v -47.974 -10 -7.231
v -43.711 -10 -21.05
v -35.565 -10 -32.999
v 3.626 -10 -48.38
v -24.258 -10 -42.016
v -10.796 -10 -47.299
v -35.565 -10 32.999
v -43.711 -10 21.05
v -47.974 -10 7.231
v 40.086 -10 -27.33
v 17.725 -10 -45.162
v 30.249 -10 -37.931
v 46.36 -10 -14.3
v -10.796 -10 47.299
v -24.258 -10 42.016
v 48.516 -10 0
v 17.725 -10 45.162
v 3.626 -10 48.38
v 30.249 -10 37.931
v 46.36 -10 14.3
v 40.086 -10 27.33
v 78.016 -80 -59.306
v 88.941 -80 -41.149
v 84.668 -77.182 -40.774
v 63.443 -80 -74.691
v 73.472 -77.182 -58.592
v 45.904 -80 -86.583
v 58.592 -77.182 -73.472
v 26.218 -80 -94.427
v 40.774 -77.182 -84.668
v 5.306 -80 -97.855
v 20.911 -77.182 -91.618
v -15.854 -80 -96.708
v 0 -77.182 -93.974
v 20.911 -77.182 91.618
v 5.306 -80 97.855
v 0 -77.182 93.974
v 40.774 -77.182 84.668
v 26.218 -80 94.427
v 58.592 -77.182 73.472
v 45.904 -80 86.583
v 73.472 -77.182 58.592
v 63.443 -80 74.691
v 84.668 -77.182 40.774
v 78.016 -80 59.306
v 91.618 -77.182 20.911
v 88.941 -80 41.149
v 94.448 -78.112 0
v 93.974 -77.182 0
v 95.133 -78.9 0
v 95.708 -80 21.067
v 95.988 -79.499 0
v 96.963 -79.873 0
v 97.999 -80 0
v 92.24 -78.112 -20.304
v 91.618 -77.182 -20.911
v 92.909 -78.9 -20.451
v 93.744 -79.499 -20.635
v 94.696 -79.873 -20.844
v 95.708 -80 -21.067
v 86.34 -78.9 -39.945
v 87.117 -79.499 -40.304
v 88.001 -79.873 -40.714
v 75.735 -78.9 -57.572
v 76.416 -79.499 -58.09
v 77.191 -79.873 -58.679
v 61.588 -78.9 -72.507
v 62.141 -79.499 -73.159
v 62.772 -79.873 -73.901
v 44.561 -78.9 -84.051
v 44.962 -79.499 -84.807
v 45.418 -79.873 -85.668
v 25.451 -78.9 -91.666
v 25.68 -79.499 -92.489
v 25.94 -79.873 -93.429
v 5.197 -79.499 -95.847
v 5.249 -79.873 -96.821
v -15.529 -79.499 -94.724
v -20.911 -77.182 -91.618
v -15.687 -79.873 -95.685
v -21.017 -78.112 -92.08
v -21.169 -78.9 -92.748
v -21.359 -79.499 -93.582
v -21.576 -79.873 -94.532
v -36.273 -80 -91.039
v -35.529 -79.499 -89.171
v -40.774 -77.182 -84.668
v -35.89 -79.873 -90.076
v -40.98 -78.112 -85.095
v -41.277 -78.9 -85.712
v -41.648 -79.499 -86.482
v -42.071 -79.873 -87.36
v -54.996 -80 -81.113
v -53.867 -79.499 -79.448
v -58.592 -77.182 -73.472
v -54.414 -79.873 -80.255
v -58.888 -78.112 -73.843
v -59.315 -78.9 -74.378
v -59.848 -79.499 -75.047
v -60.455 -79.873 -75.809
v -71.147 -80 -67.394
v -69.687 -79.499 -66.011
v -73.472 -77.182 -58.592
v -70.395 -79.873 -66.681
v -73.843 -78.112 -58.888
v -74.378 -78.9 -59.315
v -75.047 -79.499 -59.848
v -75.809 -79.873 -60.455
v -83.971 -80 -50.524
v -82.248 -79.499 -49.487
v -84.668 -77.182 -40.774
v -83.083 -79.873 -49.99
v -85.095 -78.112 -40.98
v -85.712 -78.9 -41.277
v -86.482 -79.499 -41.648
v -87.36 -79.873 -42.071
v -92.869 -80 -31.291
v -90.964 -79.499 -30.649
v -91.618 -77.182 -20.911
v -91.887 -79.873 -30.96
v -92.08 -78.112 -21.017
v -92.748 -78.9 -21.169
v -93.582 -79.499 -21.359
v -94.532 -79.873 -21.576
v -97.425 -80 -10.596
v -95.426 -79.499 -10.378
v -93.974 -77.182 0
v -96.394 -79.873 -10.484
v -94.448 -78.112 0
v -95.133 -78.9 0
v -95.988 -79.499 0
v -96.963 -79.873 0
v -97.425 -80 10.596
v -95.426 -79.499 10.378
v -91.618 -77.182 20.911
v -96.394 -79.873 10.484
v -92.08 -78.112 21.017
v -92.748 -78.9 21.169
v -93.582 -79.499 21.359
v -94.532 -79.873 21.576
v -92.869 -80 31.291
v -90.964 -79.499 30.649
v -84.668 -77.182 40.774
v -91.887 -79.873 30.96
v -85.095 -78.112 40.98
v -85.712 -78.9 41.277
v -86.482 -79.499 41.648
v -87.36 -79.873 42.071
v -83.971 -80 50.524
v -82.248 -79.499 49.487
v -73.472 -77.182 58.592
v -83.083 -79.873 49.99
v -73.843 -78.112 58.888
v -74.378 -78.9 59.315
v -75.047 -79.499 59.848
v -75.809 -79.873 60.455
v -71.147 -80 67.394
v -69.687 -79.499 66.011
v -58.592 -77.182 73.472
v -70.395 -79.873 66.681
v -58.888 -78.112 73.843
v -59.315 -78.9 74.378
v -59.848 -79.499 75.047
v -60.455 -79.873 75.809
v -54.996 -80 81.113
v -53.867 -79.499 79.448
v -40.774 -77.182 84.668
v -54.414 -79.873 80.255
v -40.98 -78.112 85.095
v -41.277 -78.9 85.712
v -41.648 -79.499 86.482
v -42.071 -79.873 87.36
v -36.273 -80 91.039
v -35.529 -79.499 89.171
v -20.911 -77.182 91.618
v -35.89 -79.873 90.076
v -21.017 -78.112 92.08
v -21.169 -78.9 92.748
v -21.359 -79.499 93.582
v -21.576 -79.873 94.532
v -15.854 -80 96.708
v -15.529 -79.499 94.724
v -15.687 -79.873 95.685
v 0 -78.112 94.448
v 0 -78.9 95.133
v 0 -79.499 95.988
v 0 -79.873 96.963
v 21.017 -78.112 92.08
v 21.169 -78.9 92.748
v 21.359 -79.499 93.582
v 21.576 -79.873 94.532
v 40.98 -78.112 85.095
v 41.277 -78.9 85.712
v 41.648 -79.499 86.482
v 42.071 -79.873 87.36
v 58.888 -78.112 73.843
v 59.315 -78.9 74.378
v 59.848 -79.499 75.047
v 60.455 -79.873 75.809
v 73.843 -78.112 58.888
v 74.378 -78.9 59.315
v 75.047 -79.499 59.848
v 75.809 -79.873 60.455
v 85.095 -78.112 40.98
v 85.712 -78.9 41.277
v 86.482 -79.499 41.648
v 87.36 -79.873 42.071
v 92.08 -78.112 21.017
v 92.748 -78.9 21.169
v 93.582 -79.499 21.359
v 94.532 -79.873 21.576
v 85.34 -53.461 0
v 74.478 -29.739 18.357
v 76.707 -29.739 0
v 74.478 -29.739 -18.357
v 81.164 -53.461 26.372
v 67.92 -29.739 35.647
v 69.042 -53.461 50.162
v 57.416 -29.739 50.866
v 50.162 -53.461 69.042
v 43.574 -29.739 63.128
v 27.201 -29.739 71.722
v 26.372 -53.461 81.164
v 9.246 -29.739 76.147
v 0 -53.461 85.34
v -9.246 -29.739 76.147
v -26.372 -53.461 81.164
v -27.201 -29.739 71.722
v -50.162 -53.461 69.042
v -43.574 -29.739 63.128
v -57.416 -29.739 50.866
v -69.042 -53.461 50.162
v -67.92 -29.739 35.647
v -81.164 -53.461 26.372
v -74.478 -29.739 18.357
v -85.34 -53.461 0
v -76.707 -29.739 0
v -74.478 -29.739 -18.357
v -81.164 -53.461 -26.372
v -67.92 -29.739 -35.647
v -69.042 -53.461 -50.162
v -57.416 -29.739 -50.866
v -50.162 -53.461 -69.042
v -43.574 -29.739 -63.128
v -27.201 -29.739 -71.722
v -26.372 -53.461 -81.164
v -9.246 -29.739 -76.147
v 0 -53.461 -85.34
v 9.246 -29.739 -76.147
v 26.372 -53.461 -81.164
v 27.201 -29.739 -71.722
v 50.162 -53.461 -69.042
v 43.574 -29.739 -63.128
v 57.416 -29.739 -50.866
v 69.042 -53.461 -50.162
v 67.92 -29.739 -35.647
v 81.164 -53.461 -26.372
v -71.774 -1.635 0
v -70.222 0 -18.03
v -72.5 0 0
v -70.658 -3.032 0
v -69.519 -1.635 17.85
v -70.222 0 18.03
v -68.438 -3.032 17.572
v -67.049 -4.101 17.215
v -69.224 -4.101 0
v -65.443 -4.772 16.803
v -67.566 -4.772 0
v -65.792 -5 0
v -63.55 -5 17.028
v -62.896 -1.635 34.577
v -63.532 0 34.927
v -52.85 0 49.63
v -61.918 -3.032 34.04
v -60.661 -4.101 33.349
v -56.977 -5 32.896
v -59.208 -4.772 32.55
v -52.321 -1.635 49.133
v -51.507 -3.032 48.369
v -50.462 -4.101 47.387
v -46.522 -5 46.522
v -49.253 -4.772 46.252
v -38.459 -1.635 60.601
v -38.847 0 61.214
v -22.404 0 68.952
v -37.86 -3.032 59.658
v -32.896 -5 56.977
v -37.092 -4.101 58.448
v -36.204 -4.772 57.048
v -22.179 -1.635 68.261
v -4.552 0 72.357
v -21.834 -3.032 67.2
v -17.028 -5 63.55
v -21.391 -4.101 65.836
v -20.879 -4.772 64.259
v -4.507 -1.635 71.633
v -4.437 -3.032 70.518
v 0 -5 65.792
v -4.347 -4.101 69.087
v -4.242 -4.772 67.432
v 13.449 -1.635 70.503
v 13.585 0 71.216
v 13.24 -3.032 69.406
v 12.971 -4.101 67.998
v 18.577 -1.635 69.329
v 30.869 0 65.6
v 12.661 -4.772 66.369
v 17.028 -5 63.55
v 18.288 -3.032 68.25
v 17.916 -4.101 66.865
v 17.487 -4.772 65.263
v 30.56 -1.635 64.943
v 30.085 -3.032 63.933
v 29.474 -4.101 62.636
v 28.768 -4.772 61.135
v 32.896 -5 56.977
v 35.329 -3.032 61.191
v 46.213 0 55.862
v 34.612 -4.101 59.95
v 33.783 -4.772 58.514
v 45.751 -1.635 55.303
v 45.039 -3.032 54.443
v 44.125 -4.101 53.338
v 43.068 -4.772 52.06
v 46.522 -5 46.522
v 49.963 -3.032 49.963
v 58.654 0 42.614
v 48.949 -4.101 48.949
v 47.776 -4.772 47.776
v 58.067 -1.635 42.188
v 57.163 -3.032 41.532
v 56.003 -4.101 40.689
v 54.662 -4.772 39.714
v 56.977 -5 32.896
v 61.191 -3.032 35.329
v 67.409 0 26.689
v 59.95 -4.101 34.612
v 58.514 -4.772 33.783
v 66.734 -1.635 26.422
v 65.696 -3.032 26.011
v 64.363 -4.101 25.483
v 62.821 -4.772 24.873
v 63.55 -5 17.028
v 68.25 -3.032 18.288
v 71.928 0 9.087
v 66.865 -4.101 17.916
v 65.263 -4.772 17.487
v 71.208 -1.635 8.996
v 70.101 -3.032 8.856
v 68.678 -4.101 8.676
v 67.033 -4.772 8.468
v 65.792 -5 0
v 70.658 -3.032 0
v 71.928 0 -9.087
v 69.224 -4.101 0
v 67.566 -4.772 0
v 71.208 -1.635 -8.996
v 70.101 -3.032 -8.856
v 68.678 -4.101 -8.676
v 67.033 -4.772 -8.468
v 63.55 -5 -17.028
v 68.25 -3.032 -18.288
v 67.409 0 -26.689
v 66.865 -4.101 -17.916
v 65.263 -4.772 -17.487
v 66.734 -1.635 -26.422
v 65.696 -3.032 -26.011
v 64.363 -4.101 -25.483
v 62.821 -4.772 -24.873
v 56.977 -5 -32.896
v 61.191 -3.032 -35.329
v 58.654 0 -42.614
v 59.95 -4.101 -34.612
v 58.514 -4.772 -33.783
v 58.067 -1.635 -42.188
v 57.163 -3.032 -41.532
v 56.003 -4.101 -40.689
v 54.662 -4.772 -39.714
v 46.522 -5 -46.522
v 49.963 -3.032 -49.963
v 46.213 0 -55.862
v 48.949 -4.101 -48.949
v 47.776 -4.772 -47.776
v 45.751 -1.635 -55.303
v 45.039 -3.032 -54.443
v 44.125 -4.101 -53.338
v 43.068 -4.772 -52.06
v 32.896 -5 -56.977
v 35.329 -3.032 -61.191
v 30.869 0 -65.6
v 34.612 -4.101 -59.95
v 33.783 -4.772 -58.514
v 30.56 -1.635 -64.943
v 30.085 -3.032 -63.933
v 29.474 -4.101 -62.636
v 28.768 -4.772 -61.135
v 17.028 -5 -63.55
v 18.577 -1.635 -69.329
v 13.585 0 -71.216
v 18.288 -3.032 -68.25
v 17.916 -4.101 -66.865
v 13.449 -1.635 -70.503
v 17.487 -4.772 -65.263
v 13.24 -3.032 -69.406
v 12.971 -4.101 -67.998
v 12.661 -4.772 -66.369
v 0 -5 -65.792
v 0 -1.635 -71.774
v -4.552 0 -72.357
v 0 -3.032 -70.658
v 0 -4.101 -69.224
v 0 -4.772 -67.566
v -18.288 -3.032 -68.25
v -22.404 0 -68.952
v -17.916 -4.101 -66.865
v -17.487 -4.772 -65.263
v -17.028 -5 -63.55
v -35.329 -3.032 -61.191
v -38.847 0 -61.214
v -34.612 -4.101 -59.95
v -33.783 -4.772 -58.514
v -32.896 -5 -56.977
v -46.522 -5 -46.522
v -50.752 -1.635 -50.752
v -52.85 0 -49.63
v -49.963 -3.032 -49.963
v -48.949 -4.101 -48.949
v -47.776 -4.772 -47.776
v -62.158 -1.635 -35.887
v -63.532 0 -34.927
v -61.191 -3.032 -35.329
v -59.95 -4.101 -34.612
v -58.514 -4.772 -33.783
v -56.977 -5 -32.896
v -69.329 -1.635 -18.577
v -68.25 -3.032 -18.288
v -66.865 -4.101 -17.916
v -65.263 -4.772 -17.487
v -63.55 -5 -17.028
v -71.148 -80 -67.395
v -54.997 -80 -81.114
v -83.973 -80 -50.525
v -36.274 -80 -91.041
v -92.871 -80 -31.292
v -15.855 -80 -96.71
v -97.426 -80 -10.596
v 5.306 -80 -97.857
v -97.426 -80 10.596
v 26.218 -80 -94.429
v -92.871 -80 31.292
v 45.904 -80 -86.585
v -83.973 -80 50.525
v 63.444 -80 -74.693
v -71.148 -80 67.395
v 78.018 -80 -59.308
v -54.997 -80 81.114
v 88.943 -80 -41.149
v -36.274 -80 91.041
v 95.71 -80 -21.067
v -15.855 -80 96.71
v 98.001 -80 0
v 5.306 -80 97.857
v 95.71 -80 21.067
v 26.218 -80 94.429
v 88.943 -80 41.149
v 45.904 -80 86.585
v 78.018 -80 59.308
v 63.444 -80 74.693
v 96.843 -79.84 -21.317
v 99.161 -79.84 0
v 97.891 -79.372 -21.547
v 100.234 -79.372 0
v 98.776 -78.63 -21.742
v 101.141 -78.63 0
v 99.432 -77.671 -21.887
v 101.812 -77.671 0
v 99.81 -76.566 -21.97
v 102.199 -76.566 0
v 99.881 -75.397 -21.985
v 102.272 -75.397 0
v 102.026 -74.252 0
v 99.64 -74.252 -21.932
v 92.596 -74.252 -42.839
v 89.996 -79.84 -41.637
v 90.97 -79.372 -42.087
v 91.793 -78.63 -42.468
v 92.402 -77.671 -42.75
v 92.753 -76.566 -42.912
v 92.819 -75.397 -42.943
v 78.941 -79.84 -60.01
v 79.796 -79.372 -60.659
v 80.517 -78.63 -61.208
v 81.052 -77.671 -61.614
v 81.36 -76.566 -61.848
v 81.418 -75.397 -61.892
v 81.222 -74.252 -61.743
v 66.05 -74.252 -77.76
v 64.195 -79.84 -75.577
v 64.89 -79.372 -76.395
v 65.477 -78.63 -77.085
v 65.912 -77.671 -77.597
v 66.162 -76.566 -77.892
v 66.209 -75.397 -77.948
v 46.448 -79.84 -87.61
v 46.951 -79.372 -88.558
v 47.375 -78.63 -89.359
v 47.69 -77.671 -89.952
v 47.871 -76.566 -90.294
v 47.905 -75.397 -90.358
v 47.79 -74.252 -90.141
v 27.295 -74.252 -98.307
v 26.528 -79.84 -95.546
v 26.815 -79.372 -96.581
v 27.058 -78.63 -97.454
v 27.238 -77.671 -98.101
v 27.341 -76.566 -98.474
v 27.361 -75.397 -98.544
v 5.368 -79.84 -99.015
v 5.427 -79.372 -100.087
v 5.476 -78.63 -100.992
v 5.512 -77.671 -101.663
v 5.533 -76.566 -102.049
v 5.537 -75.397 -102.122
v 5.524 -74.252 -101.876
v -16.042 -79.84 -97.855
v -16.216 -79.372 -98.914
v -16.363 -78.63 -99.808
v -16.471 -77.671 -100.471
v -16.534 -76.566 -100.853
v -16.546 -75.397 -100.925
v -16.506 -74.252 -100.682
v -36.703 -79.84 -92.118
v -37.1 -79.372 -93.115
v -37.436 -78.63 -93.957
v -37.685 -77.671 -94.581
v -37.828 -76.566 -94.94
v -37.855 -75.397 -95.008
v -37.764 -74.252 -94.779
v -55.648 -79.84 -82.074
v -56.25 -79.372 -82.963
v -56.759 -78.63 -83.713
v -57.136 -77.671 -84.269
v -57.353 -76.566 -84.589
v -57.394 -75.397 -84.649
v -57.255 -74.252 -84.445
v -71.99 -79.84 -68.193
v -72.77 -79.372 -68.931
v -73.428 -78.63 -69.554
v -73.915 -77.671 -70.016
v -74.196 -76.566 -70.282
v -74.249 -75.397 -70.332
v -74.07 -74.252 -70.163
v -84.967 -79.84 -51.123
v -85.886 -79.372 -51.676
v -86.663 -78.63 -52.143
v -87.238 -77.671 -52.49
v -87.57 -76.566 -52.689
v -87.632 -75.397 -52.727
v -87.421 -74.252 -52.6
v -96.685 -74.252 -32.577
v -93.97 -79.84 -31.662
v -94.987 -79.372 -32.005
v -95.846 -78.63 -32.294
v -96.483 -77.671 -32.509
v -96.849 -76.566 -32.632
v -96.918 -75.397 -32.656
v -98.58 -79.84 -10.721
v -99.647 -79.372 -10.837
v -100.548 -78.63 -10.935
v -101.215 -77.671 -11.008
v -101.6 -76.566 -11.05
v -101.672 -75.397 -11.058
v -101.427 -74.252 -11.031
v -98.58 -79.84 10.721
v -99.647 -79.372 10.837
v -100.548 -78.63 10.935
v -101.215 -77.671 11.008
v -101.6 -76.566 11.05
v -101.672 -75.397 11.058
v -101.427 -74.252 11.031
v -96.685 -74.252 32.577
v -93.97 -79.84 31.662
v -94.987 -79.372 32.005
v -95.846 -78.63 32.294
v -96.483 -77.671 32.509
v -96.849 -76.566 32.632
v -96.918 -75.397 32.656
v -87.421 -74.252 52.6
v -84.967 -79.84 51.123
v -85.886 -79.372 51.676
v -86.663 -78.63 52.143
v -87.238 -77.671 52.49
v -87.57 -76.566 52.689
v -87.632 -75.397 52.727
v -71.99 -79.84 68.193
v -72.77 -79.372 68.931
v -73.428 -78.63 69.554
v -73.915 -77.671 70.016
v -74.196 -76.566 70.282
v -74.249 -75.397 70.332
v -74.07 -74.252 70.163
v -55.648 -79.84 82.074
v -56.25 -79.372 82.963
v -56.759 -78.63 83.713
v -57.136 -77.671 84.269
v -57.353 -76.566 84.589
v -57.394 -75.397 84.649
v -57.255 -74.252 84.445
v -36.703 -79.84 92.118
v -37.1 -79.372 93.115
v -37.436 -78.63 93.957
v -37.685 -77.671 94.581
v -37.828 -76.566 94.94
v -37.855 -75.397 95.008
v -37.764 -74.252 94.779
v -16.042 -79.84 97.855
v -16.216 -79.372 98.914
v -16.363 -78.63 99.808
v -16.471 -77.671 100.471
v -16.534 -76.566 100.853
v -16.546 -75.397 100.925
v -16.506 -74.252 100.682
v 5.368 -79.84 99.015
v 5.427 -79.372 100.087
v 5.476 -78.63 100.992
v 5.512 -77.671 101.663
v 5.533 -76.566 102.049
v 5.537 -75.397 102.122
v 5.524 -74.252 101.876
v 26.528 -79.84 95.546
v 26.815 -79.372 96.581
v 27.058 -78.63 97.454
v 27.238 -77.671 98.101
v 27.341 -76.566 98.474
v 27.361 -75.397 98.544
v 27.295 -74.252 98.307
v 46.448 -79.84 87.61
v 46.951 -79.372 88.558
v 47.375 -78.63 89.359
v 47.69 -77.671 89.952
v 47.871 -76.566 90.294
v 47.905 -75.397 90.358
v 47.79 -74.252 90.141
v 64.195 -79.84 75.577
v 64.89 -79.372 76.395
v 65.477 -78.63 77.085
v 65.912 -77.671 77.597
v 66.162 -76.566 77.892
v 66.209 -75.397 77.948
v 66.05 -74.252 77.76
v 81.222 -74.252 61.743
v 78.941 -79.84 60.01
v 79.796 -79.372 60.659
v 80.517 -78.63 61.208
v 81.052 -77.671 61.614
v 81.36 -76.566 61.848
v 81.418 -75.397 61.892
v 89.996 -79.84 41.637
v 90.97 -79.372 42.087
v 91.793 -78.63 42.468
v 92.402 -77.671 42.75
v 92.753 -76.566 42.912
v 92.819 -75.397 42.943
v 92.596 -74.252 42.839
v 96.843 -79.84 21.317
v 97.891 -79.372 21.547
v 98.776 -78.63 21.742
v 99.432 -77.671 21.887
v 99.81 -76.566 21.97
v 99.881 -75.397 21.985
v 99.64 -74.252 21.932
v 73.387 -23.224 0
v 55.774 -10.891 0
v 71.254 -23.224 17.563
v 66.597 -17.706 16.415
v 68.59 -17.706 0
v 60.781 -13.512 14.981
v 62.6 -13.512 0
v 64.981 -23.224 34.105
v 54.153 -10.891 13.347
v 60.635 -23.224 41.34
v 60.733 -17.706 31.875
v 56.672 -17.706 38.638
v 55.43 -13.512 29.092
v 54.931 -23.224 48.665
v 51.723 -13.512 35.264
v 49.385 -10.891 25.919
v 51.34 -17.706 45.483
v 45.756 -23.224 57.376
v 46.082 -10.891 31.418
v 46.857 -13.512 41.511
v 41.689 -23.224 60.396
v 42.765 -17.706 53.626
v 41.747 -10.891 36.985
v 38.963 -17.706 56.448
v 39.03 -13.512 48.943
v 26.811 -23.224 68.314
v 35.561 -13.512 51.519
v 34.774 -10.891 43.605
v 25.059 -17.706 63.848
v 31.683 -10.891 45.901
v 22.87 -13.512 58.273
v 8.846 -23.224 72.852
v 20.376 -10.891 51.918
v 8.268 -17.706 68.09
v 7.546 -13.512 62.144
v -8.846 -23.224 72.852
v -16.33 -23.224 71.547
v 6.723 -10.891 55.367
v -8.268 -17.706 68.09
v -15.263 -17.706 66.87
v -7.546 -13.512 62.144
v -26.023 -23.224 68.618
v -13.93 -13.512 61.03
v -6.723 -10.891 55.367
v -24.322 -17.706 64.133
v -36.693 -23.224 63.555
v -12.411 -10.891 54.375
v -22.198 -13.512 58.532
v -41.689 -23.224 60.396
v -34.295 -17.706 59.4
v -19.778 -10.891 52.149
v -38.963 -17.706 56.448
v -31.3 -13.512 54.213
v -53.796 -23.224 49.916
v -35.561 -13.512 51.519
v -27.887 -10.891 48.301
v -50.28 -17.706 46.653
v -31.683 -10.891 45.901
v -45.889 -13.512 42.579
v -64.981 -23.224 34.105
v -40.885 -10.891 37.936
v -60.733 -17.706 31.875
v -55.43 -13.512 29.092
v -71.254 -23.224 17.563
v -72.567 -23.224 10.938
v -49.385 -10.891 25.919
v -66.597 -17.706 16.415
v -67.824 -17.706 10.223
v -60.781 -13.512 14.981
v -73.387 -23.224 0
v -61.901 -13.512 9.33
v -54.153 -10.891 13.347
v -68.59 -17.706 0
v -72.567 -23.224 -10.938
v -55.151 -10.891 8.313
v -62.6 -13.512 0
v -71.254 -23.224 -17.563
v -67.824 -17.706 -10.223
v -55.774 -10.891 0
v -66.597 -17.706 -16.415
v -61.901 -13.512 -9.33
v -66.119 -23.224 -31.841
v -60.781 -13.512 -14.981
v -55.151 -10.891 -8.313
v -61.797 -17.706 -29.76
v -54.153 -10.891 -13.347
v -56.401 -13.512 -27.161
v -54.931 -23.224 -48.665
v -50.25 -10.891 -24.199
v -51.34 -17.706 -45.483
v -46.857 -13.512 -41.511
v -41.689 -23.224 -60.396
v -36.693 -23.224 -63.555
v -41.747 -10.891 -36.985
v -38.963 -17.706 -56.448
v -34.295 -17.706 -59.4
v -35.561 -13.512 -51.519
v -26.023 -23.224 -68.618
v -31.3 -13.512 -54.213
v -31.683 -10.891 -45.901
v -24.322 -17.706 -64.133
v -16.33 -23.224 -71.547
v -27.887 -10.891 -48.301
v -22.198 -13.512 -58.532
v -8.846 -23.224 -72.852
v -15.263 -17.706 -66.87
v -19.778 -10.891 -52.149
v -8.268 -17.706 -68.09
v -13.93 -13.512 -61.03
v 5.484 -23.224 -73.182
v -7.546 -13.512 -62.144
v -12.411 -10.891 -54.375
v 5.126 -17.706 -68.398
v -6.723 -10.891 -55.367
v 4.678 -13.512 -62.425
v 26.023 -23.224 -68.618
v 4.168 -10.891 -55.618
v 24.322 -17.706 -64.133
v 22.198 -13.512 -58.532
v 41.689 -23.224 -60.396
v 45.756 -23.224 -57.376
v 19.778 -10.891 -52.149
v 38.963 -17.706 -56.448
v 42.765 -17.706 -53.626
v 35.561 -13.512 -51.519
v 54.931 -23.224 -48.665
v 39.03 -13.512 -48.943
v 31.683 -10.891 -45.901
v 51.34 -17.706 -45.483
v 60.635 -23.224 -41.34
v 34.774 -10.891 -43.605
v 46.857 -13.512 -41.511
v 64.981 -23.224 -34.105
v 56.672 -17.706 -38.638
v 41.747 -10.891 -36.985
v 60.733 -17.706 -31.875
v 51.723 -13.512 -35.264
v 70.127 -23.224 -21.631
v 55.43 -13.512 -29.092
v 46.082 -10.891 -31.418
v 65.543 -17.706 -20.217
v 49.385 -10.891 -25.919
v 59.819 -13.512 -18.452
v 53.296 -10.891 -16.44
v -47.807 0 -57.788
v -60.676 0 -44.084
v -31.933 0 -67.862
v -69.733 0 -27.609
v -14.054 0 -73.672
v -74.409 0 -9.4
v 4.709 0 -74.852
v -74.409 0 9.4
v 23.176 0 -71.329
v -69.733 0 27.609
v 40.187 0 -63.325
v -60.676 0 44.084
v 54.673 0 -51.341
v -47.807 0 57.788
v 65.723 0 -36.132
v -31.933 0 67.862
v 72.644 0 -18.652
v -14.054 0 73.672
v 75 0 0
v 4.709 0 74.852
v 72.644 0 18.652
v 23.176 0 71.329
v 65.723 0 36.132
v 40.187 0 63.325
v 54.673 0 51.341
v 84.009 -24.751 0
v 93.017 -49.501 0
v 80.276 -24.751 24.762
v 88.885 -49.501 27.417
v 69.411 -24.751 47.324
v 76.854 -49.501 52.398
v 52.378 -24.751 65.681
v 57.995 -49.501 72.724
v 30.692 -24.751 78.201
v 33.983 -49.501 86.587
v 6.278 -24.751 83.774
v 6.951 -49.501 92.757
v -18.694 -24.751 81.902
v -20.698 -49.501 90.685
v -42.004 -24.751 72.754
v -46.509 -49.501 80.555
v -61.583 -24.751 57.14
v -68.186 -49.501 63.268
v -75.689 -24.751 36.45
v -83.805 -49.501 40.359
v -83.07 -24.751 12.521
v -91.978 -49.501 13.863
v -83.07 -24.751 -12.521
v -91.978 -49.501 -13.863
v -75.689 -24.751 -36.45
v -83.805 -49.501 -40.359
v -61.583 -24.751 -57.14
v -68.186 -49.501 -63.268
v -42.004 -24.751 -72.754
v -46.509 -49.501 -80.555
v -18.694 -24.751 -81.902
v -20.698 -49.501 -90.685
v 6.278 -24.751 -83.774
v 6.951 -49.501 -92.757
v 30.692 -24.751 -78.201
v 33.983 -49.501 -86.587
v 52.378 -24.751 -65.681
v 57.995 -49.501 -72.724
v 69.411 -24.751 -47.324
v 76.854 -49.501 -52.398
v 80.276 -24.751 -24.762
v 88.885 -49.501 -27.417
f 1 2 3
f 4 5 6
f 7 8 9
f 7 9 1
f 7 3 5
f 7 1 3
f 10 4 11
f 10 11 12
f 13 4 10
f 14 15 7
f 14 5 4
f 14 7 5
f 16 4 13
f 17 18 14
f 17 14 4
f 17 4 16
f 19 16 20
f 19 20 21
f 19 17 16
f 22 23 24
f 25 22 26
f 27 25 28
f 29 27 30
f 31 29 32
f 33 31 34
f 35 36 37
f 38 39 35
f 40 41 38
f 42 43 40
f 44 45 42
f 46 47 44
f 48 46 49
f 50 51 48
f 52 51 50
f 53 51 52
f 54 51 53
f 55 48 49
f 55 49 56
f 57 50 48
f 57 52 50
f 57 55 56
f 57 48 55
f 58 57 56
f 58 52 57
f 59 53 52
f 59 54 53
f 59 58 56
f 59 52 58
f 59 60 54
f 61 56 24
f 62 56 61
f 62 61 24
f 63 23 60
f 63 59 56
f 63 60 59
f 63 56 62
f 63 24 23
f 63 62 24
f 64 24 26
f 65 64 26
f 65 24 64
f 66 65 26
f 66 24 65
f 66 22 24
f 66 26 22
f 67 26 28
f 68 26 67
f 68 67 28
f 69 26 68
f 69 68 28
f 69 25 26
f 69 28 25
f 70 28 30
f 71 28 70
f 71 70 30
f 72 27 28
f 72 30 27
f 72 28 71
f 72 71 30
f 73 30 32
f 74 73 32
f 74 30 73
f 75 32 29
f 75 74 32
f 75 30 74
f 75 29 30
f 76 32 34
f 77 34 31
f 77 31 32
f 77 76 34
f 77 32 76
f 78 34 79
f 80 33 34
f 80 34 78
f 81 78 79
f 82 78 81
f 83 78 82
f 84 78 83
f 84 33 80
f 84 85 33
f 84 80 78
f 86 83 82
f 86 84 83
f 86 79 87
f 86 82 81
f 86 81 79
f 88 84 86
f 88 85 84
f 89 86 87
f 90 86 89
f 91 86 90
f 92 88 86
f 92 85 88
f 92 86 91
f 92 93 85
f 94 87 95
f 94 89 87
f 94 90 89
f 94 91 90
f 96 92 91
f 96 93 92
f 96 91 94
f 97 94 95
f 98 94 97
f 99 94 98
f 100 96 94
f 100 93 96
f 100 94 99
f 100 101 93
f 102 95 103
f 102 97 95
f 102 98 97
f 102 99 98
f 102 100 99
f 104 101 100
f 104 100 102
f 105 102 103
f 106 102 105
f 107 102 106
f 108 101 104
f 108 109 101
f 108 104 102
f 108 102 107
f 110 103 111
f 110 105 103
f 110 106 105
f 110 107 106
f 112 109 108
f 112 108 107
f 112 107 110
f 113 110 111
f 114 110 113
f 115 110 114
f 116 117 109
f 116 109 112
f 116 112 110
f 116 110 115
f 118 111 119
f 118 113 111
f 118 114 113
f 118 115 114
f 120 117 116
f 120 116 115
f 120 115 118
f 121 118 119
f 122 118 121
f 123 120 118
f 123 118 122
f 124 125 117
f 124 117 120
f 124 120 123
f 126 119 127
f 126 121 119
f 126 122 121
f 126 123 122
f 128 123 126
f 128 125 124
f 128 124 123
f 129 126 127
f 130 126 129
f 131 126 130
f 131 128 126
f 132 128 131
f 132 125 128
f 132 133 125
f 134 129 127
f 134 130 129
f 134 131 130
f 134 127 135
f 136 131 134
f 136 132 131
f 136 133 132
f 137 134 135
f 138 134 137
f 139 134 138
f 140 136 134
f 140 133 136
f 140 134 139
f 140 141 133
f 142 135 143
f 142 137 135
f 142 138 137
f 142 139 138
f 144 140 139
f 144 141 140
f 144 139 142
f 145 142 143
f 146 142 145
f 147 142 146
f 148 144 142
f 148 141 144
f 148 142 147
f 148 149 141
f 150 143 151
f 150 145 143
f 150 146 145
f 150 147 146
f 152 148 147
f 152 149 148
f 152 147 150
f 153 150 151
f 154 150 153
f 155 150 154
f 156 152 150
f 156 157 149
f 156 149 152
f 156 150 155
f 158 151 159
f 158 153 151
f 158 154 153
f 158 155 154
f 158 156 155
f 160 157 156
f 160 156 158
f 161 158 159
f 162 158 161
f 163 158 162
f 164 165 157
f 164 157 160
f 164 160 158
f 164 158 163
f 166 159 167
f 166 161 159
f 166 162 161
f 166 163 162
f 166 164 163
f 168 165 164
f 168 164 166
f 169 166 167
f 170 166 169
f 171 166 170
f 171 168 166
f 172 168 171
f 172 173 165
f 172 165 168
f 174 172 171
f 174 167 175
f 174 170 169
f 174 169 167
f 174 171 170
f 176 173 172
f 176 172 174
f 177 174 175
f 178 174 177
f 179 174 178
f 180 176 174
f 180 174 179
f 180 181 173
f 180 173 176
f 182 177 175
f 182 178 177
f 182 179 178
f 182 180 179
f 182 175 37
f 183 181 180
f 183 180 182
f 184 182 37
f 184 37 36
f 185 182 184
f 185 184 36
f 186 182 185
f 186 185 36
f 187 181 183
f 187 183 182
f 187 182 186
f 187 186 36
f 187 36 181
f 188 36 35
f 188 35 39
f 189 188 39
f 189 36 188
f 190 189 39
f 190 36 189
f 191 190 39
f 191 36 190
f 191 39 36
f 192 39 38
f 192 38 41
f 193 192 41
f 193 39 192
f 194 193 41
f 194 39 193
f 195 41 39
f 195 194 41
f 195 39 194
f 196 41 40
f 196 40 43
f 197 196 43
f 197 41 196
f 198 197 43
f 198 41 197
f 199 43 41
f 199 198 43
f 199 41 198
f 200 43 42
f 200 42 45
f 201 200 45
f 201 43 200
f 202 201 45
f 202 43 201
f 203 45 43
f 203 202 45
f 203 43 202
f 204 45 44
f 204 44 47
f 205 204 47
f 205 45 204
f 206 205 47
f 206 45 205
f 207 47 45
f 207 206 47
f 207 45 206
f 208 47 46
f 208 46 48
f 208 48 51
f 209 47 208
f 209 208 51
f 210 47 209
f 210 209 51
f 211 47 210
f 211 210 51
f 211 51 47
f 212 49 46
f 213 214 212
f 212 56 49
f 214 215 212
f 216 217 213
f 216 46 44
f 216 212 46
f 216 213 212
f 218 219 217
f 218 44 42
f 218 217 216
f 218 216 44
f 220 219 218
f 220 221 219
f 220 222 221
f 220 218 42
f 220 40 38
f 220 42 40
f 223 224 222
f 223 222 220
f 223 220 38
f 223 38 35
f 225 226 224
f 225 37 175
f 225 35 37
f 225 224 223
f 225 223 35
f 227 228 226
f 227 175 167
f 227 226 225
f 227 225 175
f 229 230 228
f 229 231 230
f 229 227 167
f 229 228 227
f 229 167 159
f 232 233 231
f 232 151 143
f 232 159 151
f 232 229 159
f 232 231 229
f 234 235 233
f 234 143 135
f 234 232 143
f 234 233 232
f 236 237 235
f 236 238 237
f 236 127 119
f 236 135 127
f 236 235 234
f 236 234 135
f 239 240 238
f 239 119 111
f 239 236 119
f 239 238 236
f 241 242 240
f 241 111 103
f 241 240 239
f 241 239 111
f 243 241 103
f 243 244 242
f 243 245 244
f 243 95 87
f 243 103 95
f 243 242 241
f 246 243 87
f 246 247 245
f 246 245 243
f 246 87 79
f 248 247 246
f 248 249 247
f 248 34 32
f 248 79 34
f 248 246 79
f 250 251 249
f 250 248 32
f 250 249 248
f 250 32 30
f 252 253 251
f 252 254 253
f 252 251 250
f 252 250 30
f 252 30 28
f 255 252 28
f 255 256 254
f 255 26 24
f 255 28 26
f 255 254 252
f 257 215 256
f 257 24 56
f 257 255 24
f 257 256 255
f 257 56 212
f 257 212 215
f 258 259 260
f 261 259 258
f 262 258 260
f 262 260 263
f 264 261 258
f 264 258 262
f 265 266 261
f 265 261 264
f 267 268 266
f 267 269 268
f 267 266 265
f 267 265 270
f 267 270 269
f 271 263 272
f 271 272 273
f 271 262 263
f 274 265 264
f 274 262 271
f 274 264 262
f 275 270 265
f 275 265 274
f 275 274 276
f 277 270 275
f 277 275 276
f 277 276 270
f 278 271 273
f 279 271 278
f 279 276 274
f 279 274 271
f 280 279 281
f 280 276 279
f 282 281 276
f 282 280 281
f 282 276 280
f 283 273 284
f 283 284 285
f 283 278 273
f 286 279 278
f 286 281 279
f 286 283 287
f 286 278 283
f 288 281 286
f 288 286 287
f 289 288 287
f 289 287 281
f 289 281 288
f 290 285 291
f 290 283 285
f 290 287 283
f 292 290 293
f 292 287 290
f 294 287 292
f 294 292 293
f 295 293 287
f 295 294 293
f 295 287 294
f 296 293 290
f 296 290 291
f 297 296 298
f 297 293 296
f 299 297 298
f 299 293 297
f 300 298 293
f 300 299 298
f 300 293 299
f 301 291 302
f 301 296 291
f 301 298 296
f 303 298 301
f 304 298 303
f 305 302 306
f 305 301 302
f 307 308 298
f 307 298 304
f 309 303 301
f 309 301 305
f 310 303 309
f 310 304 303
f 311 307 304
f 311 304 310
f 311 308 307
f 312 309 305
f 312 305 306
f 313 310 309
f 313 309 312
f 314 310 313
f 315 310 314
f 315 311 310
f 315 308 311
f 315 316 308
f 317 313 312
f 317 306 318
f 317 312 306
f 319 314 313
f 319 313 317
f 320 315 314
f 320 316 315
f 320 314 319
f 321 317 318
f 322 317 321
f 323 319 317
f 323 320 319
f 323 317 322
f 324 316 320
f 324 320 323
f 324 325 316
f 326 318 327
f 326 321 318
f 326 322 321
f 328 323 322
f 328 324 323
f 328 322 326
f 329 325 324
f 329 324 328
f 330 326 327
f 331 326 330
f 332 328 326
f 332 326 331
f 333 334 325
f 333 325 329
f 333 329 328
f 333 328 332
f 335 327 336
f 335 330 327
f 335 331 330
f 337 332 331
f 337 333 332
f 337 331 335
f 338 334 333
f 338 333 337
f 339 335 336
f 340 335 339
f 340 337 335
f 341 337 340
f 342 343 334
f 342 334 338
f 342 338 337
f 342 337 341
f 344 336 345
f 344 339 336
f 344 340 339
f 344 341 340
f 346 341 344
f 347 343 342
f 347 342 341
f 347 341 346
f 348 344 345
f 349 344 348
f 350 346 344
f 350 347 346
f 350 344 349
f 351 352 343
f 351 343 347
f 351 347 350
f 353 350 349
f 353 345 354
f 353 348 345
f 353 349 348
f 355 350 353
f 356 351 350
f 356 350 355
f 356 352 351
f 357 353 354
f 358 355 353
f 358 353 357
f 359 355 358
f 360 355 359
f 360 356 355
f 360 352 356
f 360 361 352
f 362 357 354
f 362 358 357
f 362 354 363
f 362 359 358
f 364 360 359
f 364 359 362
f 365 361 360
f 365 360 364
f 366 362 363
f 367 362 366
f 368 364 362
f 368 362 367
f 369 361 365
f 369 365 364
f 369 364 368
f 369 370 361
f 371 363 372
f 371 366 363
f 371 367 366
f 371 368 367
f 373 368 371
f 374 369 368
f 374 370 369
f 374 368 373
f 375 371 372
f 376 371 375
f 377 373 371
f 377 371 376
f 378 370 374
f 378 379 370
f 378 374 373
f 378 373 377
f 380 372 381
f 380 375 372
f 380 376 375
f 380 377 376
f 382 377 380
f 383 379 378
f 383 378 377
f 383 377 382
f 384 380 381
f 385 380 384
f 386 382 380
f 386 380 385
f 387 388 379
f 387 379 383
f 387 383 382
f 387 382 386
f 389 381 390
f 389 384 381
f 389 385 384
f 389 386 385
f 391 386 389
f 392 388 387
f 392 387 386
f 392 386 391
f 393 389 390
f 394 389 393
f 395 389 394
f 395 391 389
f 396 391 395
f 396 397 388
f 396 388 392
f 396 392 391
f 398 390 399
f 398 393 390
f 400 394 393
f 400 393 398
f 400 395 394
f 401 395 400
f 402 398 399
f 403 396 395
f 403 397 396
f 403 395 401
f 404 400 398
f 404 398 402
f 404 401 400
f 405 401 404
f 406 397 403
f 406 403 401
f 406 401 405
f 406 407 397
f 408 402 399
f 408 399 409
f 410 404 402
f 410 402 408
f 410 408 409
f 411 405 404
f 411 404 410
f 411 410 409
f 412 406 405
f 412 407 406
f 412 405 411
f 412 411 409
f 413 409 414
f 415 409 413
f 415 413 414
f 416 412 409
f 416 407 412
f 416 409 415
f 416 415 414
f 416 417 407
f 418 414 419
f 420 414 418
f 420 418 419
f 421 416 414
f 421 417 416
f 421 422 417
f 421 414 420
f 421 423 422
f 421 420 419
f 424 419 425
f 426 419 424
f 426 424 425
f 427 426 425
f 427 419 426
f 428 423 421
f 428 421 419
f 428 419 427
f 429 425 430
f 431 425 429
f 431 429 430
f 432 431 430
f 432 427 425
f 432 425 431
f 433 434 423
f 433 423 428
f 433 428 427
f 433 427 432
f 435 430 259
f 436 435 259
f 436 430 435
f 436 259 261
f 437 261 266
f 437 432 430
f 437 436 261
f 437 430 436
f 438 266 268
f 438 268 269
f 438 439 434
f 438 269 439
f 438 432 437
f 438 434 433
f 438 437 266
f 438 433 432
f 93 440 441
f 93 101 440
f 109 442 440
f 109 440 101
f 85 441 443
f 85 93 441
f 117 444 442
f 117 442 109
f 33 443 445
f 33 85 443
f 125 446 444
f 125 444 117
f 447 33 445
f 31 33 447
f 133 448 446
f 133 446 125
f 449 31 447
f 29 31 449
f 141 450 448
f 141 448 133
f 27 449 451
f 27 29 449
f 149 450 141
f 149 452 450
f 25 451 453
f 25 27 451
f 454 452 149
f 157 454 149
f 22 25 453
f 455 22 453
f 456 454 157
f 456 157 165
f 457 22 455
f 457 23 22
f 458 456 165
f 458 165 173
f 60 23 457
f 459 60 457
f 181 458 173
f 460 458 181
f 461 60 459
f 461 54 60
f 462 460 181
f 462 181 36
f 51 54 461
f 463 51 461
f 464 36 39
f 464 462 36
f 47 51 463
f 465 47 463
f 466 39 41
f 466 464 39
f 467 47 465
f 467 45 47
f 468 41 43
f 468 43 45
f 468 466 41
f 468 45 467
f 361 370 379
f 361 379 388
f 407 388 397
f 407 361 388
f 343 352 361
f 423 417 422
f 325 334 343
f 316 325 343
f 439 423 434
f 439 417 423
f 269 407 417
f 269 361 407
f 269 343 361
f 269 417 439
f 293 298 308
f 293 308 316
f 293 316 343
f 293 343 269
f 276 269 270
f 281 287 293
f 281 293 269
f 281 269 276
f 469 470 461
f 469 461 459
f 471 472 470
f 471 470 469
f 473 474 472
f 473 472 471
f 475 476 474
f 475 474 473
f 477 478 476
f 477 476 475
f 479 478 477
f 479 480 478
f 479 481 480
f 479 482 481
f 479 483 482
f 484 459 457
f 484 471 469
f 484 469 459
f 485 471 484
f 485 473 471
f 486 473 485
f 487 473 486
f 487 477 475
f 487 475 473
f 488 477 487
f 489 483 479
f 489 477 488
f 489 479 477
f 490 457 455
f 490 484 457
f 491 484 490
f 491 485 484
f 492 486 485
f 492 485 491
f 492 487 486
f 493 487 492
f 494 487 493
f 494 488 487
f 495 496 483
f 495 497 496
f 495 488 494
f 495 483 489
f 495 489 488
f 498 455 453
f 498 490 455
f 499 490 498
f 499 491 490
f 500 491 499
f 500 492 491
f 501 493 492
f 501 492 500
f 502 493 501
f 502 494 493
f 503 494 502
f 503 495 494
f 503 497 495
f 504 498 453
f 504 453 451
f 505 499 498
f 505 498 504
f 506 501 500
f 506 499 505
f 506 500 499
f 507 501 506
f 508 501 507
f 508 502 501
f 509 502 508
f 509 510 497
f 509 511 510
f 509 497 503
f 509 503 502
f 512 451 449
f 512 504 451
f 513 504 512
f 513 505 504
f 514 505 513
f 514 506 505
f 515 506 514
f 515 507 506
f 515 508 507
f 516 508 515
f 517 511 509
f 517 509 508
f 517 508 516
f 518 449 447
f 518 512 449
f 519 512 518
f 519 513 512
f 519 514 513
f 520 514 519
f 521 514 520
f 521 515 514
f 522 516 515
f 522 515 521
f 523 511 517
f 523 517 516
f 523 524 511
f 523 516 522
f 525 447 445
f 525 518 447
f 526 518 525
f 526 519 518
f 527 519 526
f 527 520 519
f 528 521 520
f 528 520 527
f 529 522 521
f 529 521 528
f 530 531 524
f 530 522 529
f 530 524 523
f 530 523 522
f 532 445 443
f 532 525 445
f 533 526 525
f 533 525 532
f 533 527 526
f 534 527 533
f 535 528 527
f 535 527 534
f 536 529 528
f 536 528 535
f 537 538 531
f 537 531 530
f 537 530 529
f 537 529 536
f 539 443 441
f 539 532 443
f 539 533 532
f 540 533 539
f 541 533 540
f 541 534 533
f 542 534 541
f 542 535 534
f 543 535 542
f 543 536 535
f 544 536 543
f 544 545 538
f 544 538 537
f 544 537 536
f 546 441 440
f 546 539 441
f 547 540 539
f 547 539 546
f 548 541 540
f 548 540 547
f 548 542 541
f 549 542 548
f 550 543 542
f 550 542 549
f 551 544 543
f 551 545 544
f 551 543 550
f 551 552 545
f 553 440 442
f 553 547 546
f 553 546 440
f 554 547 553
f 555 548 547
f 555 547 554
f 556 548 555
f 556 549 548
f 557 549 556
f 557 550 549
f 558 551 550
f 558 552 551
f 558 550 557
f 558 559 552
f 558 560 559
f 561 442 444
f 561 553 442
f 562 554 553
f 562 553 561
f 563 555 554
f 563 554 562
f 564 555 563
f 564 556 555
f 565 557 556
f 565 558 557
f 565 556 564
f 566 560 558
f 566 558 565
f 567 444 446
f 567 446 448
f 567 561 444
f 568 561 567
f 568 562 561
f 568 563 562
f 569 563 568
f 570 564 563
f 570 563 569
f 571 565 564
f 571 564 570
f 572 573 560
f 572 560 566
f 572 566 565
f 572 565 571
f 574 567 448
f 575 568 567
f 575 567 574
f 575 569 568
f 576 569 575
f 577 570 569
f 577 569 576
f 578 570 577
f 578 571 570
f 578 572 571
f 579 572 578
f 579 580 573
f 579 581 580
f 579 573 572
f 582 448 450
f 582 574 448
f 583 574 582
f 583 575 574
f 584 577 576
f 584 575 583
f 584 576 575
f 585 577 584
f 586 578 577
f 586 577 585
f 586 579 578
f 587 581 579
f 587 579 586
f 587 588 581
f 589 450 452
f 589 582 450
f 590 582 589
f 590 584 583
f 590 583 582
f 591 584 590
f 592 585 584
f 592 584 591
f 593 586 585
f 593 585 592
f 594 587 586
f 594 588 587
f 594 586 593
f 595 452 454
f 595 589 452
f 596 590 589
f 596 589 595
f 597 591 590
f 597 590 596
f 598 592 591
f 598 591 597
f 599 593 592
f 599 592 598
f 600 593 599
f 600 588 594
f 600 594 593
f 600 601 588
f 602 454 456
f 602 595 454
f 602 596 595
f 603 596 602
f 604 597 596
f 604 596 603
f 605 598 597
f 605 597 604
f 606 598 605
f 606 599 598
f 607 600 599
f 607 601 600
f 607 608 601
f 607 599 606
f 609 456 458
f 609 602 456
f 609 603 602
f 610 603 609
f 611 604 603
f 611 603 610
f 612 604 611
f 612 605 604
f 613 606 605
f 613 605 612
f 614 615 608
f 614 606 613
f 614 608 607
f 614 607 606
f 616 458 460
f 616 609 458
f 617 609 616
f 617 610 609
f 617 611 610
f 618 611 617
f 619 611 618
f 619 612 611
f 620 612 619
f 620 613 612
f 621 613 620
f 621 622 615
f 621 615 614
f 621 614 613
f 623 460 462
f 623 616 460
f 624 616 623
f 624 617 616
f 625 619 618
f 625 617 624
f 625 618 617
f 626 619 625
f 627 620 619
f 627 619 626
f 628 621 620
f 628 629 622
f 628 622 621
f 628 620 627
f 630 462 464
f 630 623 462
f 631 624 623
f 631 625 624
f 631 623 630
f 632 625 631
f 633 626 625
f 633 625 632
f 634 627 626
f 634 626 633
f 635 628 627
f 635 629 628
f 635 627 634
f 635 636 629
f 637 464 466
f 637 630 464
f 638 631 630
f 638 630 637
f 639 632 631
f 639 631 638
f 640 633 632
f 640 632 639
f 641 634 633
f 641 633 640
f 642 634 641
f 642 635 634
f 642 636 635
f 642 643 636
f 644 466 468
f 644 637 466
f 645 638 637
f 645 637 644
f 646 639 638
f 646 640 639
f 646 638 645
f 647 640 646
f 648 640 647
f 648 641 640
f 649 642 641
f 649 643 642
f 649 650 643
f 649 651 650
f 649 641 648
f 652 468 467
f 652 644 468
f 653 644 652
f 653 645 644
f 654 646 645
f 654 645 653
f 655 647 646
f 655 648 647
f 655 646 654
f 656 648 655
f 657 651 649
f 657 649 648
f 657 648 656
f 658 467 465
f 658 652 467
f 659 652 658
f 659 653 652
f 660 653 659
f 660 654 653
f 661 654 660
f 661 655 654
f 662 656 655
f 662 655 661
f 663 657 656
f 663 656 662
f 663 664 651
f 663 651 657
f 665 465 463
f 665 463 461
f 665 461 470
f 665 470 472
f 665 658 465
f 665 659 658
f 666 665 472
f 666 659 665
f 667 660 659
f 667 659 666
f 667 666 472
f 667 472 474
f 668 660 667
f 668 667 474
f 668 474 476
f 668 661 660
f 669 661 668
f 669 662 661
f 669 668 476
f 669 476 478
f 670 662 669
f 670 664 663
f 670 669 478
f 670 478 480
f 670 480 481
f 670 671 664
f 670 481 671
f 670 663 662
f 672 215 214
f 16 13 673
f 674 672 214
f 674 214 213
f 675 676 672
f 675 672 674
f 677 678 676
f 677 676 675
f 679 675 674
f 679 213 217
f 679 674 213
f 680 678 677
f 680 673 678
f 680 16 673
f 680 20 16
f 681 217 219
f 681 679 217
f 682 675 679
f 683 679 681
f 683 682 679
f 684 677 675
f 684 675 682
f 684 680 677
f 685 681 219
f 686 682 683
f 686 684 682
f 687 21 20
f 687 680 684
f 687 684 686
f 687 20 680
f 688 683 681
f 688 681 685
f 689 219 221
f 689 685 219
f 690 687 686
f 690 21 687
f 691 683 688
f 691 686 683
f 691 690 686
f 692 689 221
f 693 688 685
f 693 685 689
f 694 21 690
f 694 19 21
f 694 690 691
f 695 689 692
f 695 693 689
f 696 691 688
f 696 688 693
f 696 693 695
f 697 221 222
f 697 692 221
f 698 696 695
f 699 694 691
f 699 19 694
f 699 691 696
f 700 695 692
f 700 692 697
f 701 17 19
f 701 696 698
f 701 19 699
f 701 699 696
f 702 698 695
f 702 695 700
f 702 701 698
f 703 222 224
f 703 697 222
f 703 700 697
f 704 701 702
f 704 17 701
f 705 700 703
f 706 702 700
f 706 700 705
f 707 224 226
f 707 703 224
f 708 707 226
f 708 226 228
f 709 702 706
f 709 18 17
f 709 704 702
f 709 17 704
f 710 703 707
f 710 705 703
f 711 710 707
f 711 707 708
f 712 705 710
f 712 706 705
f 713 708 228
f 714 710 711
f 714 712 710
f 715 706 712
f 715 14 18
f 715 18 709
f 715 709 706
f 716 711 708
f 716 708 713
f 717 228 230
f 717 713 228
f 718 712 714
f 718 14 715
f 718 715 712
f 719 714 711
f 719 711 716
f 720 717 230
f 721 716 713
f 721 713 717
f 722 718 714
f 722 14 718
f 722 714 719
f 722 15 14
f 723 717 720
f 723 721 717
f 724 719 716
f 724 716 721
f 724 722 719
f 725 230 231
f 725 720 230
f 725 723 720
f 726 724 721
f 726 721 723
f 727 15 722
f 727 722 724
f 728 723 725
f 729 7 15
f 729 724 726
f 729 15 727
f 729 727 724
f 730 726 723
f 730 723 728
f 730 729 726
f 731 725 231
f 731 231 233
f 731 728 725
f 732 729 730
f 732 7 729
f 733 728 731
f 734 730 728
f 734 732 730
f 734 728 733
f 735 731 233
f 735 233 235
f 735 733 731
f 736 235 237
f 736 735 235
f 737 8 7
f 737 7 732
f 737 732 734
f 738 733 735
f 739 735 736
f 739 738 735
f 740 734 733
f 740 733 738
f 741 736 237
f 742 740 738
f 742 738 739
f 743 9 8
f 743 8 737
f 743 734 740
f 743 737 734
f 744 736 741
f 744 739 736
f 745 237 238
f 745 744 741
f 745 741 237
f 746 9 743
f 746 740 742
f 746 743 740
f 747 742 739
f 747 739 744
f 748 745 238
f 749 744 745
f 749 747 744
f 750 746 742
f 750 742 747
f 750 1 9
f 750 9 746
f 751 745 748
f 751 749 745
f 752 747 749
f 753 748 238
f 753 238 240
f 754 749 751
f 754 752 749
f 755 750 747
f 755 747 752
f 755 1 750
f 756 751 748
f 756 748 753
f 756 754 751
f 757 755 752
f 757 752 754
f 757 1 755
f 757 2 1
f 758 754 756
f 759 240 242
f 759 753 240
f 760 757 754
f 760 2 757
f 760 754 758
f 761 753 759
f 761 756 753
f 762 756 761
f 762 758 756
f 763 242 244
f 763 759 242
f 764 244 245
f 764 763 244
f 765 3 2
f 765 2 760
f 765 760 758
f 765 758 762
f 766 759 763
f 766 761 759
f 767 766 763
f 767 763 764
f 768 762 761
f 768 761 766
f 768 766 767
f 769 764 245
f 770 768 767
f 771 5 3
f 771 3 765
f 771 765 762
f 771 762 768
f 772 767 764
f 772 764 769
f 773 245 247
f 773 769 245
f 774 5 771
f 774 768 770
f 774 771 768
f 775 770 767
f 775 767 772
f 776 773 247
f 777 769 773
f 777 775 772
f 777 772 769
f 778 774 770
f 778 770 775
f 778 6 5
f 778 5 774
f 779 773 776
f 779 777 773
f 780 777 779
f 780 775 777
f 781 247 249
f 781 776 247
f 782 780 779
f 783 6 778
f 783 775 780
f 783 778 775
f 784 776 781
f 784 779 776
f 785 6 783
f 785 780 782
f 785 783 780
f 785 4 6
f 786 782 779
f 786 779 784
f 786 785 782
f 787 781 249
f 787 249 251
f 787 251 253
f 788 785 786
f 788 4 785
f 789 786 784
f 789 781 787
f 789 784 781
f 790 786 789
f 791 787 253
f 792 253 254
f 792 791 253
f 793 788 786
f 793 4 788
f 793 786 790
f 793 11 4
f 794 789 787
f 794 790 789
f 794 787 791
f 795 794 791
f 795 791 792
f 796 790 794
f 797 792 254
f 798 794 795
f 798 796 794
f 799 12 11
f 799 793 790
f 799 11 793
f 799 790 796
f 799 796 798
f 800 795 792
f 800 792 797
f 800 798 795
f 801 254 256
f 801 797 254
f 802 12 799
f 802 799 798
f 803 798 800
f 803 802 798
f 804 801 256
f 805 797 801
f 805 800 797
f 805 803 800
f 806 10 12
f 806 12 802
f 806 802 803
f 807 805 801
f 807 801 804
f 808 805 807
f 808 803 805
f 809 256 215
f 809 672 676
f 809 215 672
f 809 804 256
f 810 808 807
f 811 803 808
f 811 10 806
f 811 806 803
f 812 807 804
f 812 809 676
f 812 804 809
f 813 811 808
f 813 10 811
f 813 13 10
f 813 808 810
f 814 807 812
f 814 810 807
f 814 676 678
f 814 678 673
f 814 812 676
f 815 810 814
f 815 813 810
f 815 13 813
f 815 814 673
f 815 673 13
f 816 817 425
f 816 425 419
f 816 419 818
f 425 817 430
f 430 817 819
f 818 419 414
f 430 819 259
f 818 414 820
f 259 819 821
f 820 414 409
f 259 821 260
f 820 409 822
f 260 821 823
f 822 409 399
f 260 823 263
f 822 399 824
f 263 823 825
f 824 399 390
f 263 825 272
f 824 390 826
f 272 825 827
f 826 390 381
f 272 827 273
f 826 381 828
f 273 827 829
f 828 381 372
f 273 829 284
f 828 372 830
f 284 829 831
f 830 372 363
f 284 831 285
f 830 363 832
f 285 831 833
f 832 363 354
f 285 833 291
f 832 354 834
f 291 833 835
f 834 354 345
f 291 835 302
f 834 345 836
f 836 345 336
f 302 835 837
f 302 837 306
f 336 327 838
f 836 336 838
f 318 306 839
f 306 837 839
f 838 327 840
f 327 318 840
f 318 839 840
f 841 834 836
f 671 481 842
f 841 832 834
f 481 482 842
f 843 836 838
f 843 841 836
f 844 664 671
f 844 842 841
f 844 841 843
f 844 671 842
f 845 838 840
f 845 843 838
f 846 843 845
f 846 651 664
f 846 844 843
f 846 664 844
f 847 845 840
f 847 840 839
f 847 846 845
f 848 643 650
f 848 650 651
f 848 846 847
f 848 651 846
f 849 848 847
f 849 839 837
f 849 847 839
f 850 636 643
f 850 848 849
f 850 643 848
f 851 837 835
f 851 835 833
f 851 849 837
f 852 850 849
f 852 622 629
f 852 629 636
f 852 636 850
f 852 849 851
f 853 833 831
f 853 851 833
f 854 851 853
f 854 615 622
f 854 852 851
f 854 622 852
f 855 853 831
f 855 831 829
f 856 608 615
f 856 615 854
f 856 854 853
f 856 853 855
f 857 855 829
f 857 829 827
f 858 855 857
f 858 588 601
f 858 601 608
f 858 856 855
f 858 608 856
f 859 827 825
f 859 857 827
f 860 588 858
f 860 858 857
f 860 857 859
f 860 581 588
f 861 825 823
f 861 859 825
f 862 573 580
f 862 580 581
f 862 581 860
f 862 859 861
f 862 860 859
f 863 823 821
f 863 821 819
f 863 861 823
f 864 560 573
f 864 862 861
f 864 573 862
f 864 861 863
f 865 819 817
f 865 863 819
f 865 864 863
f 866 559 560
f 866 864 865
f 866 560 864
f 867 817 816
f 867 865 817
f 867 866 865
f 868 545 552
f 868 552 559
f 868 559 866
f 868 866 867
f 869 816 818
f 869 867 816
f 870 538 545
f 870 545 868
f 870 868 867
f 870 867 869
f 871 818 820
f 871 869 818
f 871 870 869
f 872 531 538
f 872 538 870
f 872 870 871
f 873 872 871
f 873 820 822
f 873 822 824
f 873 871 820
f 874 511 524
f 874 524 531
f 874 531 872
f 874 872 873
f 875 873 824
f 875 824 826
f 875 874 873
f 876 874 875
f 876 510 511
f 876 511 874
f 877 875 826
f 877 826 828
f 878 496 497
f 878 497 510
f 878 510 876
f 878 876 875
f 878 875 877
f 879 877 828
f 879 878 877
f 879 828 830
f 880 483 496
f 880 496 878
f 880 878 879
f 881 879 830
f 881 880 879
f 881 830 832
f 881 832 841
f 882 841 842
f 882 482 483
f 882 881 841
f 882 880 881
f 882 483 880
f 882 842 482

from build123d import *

# Parameters (mm, degrees)
F0_R     = 75
F1_DEPTH = 80
F1_TAPER = -20
F2_R     = 95
F3_DEPTH = 70
F3_TAPER = 20
F4_R     = 30
F5_R     = 4.283
F6_R     = 72.5
F7_DEPTH = 5


# Not quite as in the source:
# - a fillet or chamfer that OpenCascade refuses, or shapes differently, is made with other operations: its cross-section is extruded or revolved along the edge and cut away or added


with BuildPart() as f1:
    # F0 (on Front) → F1 (new body)
    with BuildSketch(Plane.XZ):
        Circle(F0_R)
    extrude(amount=F1_DEPTH, taper=F1_TAPER)

    # F2 (on face) → F3 (cut)
    with BuildSketch(Plane.XZ.offset(80)):
        Circle(F2_R)
    extrude(amount=-F3_DEPTH, taper=F3_TAPER, mode=Mode.SUBTRACT)

    # F4
    f4_edges = [f1.edges().sort_by_distance(p)[0] for p in [
        (-69.522084, -10, 0),
    ]]
    fillet(f4_edges, radius=F4_R)

    # F5
    f5_edges = [f1.edges().sort_by_distance(p)[0] for p in [
        (-95, -80, 0),
        (-104.117619, -80, 0),
    ]]
    fillet(f5_edges, radius=F5_R)

    # F6 (on face) → F7 (cut)
    with BuildSketch(Plane(origin=(0, 0, 0), x_dir=(-1, 0, 0), z_dir=(0, 1, 0))):
        Circle(F6_R)
    extrude(amount=-F7_DEPTH, mode=Mode.SUBTRACT)

    # F8: fillet of radius 7 on 1 edges, made by hand

    # F8_s1 → F8_t2 (revolve)
    with BuildSketch(Plane.XY):
        with BuildLine():
            ThreePointArc((-72.5, 0), (-69.9750962002, -3.6124860802), (-65.7917960675, -5))
            Line((-65.7917960675, -5), (-72.5, -5))
            Line((-72.5, -5), (-72.5, 0))
        make_face()
    revolve(axis=Axis((0, -5, 0), (0, 1, 0)))


solid = f1.part
